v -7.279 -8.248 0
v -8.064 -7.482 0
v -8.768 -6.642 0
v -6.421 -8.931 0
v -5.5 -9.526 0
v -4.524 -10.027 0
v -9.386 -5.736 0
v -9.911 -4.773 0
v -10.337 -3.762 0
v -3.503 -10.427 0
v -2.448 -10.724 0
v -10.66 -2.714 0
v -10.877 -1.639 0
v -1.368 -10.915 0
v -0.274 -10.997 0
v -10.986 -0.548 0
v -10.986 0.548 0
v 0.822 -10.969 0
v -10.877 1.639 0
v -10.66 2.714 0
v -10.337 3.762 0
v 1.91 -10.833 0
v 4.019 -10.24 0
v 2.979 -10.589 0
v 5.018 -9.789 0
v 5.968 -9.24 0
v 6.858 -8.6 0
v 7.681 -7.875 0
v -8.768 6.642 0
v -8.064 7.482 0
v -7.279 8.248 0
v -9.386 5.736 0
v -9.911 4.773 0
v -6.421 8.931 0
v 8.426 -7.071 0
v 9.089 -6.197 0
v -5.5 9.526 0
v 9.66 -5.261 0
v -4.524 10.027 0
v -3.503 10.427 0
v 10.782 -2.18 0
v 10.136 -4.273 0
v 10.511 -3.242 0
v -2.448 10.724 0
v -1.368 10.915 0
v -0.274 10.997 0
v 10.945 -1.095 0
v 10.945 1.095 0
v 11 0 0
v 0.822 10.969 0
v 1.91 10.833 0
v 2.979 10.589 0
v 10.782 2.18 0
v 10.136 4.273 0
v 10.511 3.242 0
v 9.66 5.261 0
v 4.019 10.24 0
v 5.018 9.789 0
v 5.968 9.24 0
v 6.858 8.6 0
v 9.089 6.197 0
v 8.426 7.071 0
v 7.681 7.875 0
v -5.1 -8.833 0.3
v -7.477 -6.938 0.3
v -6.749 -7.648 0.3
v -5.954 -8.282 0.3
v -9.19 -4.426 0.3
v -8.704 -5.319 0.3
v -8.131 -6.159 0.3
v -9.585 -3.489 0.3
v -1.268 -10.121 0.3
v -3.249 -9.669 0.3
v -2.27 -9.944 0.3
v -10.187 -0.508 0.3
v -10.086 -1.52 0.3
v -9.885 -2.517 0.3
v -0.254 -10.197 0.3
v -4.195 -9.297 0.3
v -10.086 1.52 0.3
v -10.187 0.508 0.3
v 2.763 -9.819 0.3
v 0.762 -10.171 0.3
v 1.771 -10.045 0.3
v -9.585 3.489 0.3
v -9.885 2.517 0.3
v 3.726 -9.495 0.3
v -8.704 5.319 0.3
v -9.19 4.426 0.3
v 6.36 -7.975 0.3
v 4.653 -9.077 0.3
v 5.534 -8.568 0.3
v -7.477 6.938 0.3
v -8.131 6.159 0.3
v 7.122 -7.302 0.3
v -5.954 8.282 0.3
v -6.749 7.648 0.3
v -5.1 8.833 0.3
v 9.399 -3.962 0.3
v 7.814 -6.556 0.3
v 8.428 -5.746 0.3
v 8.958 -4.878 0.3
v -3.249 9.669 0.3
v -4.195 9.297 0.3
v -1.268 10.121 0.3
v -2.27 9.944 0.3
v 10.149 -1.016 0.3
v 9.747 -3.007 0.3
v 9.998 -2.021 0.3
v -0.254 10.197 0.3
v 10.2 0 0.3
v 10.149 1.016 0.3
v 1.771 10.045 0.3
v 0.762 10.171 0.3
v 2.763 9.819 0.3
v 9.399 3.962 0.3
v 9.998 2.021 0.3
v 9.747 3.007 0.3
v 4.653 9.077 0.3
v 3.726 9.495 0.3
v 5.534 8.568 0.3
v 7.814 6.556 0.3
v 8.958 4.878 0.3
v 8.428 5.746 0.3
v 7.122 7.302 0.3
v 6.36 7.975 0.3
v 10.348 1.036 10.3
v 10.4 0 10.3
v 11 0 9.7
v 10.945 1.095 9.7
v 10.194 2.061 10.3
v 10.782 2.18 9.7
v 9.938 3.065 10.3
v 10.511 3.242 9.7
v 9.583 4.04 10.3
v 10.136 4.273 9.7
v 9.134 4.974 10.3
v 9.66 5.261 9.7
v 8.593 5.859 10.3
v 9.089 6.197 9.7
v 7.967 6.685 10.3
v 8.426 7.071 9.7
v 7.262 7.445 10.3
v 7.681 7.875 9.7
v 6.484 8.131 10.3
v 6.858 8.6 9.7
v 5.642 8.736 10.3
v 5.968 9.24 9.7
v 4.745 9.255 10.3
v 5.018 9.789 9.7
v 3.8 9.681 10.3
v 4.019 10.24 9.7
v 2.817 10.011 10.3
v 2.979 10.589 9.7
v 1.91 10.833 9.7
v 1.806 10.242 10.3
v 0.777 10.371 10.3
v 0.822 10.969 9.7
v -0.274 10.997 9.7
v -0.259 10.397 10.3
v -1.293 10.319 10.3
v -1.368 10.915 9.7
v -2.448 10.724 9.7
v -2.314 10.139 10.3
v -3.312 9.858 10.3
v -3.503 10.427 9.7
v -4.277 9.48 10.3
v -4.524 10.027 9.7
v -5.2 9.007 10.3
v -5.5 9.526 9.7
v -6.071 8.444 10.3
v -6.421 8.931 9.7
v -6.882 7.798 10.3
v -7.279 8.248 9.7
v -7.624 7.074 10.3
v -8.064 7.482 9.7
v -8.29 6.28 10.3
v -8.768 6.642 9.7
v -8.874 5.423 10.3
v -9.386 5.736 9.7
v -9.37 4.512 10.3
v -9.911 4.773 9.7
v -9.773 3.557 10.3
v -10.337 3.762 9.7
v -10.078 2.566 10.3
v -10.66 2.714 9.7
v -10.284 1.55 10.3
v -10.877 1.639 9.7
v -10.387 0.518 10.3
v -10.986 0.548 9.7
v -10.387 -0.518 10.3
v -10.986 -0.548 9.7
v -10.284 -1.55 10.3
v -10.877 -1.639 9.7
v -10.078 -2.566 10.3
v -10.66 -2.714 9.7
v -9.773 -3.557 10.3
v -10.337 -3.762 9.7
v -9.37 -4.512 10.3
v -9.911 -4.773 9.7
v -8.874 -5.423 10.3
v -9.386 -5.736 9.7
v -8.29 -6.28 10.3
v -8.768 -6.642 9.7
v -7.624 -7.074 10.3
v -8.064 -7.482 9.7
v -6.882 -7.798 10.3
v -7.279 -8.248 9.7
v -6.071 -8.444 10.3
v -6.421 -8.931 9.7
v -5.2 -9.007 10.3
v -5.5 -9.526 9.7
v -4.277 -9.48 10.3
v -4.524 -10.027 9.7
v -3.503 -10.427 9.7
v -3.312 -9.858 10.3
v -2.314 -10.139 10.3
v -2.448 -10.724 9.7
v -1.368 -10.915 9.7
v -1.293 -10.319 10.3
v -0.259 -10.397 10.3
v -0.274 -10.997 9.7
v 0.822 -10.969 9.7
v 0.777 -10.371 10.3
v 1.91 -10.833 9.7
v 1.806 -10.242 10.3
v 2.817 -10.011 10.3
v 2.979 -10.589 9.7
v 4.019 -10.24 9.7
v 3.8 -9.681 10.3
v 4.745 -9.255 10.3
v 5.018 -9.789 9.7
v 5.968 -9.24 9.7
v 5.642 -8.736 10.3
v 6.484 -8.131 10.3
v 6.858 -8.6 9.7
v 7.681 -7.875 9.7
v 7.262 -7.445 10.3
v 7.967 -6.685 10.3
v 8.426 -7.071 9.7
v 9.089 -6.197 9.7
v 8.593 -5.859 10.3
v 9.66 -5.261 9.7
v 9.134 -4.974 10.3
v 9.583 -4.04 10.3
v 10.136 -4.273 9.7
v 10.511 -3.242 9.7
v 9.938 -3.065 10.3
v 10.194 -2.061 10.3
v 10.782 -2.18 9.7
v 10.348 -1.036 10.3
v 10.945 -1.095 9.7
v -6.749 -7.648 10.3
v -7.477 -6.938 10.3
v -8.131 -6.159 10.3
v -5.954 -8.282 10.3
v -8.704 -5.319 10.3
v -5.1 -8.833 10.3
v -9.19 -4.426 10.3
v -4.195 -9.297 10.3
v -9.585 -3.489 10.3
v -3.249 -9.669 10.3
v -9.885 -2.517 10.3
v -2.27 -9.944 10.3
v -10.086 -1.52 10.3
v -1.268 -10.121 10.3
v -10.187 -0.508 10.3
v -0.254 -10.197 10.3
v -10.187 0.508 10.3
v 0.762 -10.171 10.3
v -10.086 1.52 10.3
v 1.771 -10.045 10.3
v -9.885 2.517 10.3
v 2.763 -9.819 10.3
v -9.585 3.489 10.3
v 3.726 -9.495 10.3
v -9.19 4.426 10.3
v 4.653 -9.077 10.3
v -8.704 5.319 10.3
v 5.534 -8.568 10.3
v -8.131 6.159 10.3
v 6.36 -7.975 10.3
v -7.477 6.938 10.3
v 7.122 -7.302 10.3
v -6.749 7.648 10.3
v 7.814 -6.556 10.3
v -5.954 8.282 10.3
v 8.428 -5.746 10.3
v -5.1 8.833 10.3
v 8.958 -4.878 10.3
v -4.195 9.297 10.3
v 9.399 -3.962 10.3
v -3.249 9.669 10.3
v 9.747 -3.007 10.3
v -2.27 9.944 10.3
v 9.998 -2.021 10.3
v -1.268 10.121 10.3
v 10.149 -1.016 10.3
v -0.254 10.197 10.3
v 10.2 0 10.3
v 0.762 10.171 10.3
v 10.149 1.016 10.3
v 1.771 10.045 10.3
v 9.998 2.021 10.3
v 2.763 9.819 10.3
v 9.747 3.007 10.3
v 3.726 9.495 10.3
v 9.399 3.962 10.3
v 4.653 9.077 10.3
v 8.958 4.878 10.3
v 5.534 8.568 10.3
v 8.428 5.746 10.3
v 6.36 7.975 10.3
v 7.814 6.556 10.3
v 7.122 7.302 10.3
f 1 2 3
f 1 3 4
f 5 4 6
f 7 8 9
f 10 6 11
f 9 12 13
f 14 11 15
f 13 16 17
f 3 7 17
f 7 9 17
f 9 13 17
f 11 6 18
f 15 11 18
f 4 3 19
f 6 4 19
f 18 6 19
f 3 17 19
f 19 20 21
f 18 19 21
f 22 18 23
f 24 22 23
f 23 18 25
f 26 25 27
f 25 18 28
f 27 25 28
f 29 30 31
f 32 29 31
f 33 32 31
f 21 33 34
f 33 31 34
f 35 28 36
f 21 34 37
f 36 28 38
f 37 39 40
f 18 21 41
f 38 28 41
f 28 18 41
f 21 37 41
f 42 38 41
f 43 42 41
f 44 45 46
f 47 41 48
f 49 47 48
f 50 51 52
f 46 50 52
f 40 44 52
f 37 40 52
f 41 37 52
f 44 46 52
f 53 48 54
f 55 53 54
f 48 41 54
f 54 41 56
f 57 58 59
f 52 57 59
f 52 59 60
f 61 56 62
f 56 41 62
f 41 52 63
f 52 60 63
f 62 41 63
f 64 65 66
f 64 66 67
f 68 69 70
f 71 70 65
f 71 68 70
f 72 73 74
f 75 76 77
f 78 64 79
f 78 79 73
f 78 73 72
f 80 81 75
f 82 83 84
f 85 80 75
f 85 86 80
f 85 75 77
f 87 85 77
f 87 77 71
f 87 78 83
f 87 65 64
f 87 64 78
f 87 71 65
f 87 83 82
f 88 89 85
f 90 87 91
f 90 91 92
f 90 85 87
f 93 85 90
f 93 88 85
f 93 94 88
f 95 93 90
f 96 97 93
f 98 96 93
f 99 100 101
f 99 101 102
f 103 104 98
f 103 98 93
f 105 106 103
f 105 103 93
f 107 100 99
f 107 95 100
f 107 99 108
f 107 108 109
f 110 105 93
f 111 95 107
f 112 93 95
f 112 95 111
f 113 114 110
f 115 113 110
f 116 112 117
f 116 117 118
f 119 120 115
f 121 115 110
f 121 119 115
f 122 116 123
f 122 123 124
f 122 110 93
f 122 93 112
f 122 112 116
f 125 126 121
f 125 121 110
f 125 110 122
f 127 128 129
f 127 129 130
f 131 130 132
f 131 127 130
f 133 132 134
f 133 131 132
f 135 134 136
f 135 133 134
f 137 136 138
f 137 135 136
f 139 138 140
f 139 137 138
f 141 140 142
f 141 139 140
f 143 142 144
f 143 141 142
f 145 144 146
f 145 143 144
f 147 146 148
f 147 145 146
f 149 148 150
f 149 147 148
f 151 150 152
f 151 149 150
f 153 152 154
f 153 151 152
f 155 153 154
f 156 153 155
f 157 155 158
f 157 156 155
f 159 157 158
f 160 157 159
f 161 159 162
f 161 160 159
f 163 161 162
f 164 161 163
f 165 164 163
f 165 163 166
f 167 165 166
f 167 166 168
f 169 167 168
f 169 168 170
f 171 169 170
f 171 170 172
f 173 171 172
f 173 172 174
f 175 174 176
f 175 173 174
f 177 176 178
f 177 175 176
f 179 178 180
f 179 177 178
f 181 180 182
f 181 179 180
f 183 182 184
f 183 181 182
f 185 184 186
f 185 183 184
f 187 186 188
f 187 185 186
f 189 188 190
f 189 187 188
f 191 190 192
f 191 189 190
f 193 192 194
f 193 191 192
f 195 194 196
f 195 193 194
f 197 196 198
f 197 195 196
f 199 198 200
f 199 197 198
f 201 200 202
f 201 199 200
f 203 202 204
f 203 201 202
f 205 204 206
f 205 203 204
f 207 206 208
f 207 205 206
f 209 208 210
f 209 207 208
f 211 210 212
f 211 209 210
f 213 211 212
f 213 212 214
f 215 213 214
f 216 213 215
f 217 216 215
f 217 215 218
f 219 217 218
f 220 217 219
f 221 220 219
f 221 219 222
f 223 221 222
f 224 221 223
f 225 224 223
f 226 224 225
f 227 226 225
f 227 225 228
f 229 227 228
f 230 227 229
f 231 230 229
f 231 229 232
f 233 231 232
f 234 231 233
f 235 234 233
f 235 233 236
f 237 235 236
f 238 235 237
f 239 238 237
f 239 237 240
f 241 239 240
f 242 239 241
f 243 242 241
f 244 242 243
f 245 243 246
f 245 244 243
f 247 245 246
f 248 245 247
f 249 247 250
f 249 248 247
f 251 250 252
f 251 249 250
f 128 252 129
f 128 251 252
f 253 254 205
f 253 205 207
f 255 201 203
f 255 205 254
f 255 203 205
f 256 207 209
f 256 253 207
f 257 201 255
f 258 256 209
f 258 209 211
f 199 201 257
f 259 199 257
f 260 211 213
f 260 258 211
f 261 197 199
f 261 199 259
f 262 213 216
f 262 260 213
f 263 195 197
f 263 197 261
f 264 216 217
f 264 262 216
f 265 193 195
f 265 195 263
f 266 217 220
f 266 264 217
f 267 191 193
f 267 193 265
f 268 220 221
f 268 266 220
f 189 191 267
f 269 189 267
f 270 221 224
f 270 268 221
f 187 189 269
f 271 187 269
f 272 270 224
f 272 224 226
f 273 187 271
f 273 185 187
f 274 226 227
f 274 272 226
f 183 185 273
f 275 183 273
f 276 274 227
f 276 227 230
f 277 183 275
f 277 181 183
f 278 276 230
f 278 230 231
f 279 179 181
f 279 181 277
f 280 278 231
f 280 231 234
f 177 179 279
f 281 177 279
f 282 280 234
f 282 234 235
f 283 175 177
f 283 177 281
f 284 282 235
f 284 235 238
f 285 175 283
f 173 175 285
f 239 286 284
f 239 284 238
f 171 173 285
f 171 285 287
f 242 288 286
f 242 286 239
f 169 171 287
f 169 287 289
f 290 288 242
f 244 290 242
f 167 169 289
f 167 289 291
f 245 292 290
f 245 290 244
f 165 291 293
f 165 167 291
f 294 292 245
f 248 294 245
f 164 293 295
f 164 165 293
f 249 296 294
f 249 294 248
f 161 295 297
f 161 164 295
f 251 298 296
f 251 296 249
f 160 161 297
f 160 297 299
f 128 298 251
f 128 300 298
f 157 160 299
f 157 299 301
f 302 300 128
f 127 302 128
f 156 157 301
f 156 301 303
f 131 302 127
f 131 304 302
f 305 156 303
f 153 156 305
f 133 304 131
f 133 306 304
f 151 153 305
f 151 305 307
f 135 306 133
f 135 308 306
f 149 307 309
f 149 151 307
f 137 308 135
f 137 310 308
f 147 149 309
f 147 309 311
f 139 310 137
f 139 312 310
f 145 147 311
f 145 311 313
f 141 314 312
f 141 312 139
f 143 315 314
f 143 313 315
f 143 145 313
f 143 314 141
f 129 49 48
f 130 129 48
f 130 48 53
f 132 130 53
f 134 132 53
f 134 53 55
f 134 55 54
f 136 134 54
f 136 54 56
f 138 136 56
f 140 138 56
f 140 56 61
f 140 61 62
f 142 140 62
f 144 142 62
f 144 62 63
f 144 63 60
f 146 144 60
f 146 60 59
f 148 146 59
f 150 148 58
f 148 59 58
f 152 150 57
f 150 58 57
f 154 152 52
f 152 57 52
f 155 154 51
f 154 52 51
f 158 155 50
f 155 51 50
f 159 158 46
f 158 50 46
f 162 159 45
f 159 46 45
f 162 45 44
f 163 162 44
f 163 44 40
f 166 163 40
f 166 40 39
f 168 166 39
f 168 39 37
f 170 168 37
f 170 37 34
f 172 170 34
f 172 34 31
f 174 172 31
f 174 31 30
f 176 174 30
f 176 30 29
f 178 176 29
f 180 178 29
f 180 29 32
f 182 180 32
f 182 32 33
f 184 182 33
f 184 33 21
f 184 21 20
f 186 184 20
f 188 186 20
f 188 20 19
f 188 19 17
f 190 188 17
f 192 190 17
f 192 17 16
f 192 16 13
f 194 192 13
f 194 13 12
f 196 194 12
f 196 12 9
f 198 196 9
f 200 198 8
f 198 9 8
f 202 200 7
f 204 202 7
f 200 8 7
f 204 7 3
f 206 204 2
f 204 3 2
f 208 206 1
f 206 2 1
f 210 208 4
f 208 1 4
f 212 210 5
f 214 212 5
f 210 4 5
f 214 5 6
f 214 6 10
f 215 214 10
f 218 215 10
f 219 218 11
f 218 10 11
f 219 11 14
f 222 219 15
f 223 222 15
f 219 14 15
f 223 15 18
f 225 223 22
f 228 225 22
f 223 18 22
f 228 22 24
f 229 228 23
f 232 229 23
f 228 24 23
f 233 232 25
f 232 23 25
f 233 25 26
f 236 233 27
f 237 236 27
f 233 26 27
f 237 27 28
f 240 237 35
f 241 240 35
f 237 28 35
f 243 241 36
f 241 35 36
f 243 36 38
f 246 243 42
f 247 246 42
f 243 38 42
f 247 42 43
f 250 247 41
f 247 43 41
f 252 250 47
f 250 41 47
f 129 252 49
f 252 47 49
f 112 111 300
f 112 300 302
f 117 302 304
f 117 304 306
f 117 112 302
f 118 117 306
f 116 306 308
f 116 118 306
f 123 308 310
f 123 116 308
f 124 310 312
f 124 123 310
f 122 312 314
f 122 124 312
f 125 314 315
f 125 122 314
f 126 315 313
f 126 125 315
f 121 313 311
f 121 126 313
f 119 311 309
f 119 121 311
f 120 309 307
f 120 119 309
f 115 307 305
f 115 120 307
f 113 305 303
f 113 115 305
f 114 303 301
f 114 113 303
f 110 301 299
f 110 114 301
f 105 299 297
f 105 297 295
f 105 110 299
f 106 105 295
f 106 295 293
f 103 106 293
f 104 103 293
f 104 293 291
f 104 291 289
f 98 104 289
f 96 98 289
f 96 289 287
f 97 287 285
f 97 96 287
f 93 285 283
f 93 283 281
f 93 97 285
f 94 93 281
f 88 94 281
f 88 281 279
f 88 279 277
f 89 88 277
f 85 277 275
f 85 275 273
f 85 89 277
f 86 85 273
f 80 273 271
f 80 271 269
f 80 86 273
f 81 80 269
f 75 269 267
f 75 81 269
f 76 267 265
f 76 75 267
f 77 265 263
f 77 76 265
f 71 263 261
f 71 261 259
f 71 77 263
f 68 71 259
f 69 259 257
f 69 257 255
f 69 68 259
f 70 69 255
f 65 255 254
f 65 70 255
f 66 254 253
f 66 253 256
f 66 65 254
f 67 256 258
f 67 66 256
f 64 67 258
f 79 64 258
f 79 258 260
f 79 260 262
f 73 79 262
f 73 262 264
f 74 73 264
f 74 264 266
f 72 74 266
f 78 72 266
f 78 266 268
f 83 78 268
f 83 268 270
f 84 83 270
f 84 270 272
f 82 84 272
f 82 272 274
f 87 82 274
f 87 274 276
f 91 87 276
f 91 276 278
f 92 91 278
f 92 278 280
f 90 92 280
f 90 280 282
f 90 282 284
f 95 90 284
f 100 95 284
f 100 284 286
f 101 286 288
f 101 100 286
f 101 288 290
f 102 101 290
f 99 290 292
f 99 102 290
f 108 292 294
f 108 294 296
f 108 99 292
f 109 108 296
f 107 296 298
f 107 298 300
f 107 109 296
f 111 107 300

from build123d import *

# Parameters (mm, degrees)
SKETCH_R      = 11
PAD_DEPTH     = 0.3
SKETCH001_R   = 11
SKETCH001_R_2 = 10.2
PAD001_DEPTH  = 10
CHAMFER_SIZE  = 0.6


with BuildPart() as part:
    # Sketch → Pad (new body)
    with BuildSketch(Plane.XY):
        Circle(SKETCH_R)
    extrude(amount=PAD_DEPTH)

    # Sketch001 (on Face3 of Pad) → Pad001 (join)
    with BuildSketch(Plane.XY.offset(0.3)):
        Circle(SKETCH001_R)
        Circle(SKETCH001_R_2, mode=Mode.SUBTRACT)
    extrude(amount=PAD001_DEPTH)

    # Chamfer
    chamfer_edges = [part.edges().sort_by_distance(p)[0] for p in [
        (-11, 0, 10.3),
    ]]
    chamfer(chamfer_edges, length=CHAMFER_SIZE)


solid = part.part
